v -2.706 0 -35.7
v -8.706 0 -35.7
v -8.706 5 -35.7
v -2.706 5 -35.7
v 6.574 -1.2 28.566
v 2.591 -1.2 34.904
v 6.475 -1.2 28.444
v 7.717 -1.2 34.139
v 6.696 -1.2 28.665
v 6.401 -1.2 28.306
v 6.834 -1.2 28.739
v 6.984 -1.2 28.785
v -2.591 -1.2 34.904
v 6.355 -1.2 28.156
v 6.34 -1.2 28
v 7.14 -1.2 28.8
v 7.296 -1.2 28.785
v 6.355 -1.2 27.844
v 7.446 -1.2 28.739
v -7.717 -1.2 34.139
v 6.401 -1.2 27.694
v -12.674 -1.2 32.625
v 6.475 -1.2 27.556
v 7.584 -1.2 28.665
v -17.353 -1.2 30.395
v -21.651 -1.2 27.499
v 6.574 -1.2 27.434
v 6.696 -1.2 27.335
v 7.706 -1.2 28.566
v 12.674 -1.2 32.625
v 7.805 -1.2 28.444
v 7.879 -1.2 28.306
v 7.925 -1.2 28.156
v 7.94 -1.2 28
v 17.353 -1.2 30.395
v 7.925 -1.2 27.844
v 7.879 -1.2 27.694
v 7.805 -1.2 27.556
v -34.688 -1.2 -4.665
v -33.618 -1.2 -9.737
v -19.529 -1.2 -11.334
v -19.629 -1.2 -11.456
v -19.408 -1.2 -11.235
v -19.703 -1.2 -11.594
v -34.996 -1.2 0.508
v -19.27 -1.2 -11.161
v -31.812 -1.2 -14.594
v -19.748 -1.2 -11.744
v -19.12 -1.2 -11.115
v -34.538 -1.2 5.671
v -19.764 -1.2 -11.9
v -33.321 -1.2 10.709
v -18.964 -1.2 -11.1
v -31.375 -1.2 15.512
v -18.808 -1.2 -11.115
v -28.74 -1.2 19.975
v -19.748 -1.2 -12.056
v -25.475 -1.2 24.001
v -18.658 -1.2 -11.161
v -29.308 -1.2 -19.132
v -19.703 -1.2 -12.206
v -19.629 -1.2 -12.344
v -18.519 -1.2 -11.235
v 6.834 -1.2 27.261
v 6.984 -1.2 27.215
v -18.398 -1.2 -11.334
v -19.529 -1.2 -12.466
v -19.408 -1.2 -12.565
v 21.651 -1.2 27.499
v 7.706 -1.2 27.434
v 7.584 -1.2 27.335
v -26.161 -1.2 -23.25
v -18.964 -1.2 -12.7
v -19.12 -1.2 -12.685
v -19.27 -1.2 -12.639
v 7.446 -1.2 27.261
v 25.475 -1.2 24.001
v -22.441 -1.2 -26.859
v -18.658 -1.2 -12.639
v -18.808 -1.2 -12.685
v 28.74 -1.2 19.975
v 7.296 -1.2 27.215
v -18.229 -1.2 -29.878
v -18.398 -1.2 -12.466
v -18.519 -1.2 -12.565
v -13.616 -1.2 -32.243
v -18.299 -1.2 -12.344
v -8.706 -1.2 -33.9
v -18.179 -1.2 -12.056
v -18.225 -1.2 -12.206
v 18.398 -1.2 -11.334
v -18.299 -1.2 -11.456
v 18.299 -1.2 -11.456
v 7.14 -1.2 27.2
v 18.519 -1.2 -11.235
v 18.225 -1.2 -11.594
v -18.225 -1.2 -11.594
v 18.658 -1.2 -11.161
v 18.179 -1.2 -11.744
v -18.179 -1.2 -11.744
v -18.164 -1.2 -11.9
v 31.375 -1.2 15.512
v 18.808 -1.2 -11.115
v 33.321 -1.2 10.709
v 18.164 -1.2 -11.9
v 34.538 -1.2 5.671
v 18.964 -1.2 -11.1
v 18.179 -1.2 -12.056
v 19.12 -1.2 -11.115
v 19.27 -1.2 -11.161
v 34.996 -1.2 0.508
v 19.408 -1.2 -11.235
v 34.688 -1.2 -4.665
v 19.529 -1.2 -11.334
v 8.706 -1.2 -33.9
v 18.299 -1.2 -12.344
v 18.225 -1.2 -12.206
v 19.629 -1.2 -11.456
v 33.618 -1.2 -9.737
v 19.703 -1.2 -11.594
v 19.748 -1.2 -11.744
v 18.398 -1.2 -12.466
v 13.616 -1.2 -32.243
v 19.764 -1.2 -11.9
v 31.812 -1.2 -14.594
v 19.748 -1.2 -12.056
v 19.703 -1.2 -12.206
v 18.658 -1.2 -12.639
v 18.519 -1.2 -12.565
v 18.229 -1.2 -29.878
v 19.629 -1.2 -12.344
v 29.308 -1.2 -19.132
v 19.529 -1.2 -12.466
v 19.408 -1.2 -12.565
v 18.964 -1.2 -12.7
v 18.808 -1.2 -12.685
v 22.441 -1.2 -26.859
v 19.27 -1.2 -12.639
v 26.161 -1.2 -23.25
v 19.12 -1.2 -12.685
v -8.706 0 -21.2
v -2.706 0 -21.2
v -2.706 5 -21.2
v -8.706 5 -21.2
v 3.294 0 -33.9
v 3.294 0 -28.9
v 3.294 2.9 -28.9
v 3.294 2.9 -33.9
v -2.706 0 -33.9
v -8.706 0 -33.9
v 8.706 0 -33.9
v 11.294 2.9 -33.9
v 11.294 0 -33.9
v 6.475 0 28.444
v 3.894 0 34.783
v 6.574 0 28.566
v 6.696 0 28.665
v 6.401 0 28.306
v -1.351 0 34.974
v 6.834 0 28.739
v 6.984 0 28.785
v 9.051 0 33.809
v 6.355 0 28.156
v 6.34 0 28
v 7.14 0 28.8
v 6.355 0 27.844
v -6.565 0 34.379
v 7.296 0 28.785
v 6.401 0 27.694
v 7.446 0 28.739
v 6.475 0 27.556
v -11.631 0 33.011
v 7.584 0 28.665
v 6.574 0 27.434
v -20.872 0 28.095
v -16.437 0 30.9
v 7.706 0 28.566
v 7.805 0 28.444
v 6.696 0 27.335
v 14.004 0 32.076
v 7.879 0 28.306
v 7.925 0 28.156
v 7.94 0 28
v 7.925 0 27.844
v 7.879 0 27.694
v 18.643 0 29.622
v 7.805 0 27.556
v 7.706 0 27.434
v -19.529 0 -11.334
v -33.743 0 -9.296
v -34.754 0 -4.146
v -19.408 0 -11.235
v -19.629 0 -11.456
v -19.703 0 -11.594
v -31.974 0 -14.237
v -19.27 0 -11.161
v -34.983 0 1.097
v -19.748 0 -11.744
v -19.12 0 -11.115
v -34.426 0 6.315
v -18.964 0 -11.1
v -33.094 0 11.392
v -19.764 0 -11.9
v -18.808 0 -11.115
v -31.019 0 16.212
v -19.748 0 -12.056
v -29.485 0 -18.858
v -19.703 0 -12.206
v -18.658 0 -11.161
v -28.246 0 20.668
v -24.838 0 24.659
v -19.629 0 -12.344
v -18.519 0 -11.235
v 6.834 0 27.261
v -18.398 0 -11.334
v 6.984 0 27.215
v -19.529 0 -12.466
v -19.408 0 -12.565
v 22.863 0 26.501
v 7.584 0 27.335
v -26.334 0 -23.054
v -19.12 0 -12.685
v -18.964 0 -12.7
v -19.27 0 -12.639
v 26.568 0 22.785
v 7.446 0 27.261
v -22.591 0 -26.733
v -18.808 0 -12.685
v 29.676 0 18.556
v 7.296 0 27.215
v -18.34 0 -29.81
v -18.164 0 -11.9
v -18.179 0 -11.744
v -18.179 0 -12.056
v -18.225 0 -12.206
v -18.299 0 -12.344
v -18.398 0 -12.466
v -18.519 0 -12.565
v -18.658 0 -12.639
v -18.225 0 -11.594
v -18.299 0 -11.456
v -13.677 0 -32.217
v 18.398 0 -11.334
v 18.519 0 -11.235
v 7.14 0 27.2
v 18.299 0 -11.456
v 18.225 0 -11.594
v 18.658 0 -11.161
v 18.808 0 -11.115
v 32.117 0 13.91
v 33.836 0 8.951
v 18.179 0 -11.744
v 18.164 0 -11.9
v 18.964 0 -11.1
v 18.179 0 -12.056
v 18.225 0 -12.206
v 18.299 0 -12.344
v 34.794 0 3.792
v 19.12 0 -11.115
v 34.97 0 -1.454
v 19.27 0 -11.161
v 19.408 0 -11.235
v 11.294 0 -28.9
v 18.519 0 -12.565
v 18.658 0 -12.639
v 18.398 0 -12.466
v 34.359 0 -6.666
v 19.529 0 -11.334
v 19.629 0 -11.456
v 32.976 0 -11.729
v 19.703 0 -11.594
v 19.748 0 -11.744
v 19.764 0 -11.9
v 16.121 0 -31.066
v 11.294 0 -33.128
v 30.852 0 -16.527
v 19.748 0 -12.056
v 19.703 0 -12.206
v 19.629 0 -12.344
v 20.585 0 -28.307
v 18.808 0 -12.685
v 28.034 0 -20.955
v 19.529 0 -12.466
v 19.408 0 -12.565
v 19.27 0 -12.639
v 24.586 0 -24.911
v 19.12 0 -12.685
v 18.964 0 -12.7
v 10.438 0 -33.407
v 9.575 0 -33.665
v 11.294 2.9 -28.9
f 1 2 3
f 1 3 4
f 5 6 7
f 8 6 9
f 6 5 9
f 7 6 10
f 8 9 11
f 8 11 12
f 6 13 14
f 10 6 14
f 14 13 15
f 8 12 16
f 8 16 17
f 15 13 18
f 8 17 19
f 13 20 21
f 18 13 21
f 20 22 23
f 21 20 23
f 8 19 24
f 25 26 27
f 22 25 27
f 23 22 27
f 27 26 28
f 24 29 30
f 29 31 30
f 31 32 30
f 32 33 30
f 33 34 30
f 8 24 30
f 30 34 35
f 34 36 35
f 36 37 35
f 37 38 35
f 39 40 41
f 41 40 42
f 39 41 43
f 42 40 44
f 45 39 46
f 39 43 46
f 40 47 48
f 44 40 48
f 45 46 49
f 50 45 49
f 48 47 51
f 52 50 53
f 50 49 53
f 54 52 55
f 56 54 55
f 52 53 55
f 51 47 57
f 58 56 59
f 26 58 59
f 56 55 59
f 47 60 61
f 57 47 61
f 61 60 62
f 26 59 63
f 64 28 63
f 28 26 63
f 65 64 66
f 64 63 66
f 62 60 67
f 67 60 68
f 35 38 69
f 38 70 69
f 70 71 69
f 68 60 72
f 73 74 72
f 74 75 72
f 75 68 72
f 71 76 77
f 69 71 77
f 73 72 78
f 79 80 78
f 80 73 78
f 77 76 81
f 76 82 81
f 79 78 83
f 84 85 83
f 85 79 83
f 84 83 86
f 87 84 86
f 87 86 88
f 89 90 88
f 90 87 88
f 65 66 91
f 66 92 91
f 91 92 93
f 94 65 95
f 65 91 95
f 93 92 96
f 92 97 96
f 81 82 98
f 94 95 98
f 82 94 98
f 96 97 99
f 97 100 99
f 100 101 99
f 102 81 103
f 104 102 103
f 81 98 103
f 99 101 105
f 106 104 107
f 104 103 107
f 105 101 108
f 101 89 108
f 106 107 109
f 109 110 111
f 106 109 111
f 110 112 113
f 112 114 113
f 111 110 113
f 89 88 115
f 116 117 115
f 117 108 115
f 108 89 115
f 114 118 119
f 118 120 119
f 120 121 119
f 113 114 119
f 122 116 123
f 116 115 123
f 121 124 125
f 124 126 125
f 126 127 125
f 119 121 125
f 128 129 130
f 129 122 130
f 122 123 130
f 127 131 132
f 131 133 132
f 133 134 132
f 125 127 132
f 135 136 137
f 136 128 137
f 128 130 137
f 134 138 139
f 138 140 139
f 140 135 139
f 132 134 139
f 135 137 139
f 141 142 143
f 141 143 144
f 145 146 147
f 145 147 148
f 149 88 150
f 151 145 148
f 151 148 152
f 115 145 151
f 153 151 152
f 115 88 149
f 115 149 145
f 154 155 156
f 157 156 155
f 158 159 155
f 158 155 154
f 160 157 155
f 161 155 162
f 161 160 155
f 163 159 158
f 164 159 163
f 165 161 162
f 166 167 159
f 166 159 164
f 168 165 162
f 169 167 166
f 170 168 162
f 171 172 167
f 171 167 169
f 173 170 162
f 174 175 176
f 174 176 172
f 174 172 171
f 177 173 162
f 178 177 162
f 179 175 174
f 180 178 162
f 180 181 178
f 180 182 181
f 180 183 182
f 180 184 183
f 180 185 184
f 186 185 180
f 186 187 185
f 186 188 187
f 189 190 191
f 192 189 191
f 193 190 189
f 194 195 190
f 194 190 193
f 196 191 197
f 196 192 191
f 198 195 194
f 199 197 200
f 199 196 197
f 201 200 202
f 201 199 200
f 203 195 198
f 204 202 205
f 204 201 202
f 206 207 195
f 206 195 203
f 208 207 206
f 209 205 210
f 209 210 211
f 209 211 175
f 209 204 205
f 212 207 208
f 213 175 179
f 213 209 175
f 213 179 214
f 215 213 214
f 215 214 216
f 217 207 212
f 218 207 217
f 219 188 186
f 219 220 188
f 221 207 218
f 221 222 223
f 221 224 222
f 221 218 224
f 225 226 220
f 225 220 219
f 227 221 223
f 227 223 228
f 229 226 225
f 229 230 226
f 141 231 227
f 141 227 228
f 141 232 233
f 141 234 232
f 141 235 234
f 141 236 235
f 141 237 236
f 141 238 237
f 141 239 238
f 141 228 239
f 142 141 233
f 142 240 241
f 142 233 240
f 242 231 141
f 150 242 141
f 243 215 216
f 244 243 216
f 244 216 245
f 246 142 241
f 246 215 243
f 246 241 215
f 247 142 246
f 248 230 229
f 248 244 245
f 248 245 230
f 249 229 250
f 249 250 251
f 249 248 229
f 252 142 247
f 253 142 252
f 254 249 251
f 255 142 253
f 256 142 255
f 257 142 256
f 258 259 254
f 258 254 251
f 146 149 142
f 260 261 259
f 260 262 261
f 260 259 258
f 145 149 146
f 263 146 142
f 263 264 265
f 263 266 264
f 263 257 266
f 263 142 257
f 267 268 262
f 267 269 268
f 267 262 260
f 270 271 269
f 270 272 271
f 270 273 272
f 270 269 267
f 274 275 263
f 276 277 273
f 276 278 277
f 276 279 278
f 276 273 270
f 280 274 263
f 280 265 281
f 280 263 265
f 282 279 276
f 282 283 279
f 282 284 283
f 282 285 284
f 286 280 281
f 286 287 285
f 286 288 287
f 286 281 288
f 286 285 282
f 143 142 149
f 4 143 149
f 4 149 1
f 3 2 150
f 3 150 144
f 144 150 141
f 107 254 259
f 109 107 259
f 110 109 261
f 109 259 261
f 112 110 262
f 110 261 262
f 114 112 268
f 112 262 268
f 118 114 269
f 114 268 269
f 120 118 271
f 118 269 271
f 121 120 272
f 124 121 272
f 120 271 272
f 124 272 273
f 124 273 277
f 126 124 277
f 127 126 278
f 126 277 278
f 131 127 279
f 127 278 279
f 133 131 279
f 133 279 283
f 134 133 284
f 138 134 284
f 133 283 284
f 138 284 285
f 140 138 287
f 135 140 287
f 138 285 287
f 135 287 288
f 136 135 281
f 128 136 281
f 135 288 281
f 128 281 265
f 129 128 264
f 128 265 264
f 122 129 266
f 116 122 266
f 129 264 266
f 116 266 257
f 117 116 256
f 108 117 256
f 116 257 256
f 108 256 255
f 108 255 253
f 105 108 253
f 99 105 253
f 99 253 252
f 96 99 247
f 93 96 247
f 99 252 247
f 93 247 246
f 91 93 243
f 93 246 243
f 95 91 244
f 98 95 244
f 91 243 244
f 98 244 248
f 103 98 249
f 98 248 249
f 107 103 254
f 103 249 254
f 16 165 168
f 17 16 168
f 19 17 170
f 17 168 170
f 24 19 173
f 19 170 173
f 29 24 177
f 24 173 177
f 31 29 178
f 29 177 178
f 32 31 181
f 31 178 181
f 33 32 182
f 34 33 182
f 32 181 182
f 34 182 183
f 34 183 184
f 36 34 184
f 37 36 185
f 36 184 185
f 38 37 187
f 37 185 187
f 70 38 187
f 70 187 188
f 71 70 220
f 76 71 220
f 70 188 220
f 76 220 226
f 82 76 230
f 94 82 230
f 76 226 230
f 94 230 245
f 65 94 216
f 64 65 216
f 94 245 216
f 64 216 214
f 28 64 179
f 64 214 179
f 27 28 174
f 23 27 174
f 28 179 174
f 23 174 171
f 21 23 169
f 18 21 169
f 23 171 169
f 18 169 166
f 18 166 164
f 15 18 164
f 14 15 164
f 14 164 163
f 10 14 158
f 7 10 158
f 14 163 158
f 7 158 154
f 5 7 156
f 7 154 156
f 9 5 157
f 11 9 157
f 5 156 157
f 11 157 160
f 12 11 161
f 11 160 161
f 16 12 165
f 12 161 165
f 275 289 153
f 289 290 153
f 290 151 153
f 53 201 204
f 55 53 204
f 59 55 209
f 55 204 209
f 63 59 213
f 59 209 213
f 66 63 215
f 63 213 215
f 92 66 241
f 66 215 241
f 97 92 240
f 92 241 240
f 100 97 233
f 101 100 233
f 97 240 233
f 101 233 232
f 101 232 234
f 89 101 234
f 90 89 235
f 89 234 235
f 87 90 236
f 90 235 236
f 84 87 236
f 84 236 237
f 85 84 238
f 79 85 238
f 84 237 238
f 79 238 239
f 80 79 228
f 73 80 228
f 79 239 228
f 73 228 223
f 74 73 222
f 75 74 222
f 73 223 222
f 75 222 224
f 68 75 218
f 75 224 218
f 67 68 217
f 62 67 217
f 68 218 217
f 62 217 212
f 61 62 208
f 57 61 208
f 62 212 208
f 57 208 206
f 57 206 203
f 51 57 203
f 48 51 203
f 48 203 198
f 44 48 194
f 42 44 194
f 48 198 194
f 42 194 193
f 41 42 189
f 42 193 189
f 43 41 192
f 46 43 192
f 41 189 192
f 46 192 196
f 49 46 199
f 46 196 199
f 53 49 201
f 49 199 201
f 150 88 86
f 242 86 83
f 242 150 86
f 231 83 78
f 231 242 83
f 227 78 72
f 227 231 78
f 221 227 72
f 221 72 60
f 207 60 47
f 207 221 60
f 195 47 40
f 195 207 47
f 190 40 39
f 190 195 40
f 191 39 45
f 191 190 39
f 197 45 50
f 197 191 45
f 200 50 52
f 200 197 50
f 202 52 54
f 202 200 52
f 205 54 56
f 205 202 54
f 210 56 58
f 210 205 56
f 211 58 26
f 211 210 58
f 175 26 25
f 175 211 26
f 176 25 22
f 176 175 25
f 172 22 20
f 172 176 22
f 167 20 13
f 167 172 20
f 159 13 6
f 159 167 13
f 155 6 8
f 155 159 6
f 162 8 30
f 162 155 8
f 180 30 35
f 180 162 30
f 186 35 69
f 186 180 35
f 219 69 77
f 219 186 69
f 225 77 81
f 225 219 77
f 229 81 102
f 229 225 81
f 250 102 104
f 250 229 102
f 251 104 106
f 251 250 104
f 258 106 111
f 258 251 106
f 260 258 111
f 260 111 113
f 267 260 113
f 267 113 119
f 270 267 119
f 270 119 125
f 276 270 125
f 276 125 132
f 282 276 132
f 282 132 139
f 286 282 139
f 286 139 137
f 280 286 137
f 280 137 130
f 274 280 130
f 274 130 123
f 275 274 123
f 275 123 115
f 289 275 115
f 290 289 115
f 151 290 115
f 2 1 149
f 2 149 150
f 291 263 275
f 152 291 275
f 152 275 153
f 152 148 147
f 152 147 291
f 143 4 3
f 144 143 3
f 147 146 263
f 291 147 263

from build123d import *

# Parameters (mm, degrees)
BOSS_EXTRUDE1_DEPTH = 5
SKETCH1_4_R         = 0.8
BOSS_EXTRUDE3_DEPTH = 1.2
SKETCH4_W           = 8
SKETCH4_H           = 5
BOSS_EXTRUDE5_DEPTH = 2.9


with BuildPart() as part:
    # Sketch1 → Boss-Extrude1 (new body)
    with BuildSketch(Plane(origin=(0, 0, 0), x_dir=(1, 0, 0), z_dir=(0, 1, 0))):
        Polygon((-8.705745229, 33.9), (-8.705745229, 35.7), (-2.705745229, 35.7), (-2.705745229, 33.9), (-2.705745229, 21.2), (-8.705745229, 21.2), align=None)
    extrude(amount=BOSS_EXTRUDE1_DEPTH)

    # Sketch1<4> → Boss-Extrude3 (add)
    with BuildSketch(Plane(origin=(0, 0, 0), x_dir=(1, 0, 0), z_dir=(0, 1, 0))):
        with BuildLine():
            ThreePointArc((-8.705745229, 33.9), (0, -35), (8.705745229, 33.9))
            Line((8.705745229, 33.9), (-8.705745229, 33.9))
        make_face()
        with Locations((7.14, -28)):
            Circle(SKETCH1_4_R, mode=Mode.SUBTRACT)
        with Locations((-18.963757819, 11.9)):
            Circle(SKETCH1_4_R, mode=Mode.SUBTRACT)
        with Locations((18.963757819, 11.9)):
            Circle(SKETCH1_4_R, mode=Mode.SUBTRACT)
    extrude(amount=-BOSS_EXTRUDE3_DEPTH)

    # Sketch4 → Boss-Extrude5 (add)
    with BuildSketch(Plane(origin=(0, 0, 0), x_dir=(1, 0, 0), z_dir=(0, 1, 0))):
        with Locations((7.294254771, 31.4)):
            Rectangle(SKETCH4_W, SKETCH4_H)
    extrude(amount=BOSS_EXTRUDE5_DEPTH)


solid = part.part
